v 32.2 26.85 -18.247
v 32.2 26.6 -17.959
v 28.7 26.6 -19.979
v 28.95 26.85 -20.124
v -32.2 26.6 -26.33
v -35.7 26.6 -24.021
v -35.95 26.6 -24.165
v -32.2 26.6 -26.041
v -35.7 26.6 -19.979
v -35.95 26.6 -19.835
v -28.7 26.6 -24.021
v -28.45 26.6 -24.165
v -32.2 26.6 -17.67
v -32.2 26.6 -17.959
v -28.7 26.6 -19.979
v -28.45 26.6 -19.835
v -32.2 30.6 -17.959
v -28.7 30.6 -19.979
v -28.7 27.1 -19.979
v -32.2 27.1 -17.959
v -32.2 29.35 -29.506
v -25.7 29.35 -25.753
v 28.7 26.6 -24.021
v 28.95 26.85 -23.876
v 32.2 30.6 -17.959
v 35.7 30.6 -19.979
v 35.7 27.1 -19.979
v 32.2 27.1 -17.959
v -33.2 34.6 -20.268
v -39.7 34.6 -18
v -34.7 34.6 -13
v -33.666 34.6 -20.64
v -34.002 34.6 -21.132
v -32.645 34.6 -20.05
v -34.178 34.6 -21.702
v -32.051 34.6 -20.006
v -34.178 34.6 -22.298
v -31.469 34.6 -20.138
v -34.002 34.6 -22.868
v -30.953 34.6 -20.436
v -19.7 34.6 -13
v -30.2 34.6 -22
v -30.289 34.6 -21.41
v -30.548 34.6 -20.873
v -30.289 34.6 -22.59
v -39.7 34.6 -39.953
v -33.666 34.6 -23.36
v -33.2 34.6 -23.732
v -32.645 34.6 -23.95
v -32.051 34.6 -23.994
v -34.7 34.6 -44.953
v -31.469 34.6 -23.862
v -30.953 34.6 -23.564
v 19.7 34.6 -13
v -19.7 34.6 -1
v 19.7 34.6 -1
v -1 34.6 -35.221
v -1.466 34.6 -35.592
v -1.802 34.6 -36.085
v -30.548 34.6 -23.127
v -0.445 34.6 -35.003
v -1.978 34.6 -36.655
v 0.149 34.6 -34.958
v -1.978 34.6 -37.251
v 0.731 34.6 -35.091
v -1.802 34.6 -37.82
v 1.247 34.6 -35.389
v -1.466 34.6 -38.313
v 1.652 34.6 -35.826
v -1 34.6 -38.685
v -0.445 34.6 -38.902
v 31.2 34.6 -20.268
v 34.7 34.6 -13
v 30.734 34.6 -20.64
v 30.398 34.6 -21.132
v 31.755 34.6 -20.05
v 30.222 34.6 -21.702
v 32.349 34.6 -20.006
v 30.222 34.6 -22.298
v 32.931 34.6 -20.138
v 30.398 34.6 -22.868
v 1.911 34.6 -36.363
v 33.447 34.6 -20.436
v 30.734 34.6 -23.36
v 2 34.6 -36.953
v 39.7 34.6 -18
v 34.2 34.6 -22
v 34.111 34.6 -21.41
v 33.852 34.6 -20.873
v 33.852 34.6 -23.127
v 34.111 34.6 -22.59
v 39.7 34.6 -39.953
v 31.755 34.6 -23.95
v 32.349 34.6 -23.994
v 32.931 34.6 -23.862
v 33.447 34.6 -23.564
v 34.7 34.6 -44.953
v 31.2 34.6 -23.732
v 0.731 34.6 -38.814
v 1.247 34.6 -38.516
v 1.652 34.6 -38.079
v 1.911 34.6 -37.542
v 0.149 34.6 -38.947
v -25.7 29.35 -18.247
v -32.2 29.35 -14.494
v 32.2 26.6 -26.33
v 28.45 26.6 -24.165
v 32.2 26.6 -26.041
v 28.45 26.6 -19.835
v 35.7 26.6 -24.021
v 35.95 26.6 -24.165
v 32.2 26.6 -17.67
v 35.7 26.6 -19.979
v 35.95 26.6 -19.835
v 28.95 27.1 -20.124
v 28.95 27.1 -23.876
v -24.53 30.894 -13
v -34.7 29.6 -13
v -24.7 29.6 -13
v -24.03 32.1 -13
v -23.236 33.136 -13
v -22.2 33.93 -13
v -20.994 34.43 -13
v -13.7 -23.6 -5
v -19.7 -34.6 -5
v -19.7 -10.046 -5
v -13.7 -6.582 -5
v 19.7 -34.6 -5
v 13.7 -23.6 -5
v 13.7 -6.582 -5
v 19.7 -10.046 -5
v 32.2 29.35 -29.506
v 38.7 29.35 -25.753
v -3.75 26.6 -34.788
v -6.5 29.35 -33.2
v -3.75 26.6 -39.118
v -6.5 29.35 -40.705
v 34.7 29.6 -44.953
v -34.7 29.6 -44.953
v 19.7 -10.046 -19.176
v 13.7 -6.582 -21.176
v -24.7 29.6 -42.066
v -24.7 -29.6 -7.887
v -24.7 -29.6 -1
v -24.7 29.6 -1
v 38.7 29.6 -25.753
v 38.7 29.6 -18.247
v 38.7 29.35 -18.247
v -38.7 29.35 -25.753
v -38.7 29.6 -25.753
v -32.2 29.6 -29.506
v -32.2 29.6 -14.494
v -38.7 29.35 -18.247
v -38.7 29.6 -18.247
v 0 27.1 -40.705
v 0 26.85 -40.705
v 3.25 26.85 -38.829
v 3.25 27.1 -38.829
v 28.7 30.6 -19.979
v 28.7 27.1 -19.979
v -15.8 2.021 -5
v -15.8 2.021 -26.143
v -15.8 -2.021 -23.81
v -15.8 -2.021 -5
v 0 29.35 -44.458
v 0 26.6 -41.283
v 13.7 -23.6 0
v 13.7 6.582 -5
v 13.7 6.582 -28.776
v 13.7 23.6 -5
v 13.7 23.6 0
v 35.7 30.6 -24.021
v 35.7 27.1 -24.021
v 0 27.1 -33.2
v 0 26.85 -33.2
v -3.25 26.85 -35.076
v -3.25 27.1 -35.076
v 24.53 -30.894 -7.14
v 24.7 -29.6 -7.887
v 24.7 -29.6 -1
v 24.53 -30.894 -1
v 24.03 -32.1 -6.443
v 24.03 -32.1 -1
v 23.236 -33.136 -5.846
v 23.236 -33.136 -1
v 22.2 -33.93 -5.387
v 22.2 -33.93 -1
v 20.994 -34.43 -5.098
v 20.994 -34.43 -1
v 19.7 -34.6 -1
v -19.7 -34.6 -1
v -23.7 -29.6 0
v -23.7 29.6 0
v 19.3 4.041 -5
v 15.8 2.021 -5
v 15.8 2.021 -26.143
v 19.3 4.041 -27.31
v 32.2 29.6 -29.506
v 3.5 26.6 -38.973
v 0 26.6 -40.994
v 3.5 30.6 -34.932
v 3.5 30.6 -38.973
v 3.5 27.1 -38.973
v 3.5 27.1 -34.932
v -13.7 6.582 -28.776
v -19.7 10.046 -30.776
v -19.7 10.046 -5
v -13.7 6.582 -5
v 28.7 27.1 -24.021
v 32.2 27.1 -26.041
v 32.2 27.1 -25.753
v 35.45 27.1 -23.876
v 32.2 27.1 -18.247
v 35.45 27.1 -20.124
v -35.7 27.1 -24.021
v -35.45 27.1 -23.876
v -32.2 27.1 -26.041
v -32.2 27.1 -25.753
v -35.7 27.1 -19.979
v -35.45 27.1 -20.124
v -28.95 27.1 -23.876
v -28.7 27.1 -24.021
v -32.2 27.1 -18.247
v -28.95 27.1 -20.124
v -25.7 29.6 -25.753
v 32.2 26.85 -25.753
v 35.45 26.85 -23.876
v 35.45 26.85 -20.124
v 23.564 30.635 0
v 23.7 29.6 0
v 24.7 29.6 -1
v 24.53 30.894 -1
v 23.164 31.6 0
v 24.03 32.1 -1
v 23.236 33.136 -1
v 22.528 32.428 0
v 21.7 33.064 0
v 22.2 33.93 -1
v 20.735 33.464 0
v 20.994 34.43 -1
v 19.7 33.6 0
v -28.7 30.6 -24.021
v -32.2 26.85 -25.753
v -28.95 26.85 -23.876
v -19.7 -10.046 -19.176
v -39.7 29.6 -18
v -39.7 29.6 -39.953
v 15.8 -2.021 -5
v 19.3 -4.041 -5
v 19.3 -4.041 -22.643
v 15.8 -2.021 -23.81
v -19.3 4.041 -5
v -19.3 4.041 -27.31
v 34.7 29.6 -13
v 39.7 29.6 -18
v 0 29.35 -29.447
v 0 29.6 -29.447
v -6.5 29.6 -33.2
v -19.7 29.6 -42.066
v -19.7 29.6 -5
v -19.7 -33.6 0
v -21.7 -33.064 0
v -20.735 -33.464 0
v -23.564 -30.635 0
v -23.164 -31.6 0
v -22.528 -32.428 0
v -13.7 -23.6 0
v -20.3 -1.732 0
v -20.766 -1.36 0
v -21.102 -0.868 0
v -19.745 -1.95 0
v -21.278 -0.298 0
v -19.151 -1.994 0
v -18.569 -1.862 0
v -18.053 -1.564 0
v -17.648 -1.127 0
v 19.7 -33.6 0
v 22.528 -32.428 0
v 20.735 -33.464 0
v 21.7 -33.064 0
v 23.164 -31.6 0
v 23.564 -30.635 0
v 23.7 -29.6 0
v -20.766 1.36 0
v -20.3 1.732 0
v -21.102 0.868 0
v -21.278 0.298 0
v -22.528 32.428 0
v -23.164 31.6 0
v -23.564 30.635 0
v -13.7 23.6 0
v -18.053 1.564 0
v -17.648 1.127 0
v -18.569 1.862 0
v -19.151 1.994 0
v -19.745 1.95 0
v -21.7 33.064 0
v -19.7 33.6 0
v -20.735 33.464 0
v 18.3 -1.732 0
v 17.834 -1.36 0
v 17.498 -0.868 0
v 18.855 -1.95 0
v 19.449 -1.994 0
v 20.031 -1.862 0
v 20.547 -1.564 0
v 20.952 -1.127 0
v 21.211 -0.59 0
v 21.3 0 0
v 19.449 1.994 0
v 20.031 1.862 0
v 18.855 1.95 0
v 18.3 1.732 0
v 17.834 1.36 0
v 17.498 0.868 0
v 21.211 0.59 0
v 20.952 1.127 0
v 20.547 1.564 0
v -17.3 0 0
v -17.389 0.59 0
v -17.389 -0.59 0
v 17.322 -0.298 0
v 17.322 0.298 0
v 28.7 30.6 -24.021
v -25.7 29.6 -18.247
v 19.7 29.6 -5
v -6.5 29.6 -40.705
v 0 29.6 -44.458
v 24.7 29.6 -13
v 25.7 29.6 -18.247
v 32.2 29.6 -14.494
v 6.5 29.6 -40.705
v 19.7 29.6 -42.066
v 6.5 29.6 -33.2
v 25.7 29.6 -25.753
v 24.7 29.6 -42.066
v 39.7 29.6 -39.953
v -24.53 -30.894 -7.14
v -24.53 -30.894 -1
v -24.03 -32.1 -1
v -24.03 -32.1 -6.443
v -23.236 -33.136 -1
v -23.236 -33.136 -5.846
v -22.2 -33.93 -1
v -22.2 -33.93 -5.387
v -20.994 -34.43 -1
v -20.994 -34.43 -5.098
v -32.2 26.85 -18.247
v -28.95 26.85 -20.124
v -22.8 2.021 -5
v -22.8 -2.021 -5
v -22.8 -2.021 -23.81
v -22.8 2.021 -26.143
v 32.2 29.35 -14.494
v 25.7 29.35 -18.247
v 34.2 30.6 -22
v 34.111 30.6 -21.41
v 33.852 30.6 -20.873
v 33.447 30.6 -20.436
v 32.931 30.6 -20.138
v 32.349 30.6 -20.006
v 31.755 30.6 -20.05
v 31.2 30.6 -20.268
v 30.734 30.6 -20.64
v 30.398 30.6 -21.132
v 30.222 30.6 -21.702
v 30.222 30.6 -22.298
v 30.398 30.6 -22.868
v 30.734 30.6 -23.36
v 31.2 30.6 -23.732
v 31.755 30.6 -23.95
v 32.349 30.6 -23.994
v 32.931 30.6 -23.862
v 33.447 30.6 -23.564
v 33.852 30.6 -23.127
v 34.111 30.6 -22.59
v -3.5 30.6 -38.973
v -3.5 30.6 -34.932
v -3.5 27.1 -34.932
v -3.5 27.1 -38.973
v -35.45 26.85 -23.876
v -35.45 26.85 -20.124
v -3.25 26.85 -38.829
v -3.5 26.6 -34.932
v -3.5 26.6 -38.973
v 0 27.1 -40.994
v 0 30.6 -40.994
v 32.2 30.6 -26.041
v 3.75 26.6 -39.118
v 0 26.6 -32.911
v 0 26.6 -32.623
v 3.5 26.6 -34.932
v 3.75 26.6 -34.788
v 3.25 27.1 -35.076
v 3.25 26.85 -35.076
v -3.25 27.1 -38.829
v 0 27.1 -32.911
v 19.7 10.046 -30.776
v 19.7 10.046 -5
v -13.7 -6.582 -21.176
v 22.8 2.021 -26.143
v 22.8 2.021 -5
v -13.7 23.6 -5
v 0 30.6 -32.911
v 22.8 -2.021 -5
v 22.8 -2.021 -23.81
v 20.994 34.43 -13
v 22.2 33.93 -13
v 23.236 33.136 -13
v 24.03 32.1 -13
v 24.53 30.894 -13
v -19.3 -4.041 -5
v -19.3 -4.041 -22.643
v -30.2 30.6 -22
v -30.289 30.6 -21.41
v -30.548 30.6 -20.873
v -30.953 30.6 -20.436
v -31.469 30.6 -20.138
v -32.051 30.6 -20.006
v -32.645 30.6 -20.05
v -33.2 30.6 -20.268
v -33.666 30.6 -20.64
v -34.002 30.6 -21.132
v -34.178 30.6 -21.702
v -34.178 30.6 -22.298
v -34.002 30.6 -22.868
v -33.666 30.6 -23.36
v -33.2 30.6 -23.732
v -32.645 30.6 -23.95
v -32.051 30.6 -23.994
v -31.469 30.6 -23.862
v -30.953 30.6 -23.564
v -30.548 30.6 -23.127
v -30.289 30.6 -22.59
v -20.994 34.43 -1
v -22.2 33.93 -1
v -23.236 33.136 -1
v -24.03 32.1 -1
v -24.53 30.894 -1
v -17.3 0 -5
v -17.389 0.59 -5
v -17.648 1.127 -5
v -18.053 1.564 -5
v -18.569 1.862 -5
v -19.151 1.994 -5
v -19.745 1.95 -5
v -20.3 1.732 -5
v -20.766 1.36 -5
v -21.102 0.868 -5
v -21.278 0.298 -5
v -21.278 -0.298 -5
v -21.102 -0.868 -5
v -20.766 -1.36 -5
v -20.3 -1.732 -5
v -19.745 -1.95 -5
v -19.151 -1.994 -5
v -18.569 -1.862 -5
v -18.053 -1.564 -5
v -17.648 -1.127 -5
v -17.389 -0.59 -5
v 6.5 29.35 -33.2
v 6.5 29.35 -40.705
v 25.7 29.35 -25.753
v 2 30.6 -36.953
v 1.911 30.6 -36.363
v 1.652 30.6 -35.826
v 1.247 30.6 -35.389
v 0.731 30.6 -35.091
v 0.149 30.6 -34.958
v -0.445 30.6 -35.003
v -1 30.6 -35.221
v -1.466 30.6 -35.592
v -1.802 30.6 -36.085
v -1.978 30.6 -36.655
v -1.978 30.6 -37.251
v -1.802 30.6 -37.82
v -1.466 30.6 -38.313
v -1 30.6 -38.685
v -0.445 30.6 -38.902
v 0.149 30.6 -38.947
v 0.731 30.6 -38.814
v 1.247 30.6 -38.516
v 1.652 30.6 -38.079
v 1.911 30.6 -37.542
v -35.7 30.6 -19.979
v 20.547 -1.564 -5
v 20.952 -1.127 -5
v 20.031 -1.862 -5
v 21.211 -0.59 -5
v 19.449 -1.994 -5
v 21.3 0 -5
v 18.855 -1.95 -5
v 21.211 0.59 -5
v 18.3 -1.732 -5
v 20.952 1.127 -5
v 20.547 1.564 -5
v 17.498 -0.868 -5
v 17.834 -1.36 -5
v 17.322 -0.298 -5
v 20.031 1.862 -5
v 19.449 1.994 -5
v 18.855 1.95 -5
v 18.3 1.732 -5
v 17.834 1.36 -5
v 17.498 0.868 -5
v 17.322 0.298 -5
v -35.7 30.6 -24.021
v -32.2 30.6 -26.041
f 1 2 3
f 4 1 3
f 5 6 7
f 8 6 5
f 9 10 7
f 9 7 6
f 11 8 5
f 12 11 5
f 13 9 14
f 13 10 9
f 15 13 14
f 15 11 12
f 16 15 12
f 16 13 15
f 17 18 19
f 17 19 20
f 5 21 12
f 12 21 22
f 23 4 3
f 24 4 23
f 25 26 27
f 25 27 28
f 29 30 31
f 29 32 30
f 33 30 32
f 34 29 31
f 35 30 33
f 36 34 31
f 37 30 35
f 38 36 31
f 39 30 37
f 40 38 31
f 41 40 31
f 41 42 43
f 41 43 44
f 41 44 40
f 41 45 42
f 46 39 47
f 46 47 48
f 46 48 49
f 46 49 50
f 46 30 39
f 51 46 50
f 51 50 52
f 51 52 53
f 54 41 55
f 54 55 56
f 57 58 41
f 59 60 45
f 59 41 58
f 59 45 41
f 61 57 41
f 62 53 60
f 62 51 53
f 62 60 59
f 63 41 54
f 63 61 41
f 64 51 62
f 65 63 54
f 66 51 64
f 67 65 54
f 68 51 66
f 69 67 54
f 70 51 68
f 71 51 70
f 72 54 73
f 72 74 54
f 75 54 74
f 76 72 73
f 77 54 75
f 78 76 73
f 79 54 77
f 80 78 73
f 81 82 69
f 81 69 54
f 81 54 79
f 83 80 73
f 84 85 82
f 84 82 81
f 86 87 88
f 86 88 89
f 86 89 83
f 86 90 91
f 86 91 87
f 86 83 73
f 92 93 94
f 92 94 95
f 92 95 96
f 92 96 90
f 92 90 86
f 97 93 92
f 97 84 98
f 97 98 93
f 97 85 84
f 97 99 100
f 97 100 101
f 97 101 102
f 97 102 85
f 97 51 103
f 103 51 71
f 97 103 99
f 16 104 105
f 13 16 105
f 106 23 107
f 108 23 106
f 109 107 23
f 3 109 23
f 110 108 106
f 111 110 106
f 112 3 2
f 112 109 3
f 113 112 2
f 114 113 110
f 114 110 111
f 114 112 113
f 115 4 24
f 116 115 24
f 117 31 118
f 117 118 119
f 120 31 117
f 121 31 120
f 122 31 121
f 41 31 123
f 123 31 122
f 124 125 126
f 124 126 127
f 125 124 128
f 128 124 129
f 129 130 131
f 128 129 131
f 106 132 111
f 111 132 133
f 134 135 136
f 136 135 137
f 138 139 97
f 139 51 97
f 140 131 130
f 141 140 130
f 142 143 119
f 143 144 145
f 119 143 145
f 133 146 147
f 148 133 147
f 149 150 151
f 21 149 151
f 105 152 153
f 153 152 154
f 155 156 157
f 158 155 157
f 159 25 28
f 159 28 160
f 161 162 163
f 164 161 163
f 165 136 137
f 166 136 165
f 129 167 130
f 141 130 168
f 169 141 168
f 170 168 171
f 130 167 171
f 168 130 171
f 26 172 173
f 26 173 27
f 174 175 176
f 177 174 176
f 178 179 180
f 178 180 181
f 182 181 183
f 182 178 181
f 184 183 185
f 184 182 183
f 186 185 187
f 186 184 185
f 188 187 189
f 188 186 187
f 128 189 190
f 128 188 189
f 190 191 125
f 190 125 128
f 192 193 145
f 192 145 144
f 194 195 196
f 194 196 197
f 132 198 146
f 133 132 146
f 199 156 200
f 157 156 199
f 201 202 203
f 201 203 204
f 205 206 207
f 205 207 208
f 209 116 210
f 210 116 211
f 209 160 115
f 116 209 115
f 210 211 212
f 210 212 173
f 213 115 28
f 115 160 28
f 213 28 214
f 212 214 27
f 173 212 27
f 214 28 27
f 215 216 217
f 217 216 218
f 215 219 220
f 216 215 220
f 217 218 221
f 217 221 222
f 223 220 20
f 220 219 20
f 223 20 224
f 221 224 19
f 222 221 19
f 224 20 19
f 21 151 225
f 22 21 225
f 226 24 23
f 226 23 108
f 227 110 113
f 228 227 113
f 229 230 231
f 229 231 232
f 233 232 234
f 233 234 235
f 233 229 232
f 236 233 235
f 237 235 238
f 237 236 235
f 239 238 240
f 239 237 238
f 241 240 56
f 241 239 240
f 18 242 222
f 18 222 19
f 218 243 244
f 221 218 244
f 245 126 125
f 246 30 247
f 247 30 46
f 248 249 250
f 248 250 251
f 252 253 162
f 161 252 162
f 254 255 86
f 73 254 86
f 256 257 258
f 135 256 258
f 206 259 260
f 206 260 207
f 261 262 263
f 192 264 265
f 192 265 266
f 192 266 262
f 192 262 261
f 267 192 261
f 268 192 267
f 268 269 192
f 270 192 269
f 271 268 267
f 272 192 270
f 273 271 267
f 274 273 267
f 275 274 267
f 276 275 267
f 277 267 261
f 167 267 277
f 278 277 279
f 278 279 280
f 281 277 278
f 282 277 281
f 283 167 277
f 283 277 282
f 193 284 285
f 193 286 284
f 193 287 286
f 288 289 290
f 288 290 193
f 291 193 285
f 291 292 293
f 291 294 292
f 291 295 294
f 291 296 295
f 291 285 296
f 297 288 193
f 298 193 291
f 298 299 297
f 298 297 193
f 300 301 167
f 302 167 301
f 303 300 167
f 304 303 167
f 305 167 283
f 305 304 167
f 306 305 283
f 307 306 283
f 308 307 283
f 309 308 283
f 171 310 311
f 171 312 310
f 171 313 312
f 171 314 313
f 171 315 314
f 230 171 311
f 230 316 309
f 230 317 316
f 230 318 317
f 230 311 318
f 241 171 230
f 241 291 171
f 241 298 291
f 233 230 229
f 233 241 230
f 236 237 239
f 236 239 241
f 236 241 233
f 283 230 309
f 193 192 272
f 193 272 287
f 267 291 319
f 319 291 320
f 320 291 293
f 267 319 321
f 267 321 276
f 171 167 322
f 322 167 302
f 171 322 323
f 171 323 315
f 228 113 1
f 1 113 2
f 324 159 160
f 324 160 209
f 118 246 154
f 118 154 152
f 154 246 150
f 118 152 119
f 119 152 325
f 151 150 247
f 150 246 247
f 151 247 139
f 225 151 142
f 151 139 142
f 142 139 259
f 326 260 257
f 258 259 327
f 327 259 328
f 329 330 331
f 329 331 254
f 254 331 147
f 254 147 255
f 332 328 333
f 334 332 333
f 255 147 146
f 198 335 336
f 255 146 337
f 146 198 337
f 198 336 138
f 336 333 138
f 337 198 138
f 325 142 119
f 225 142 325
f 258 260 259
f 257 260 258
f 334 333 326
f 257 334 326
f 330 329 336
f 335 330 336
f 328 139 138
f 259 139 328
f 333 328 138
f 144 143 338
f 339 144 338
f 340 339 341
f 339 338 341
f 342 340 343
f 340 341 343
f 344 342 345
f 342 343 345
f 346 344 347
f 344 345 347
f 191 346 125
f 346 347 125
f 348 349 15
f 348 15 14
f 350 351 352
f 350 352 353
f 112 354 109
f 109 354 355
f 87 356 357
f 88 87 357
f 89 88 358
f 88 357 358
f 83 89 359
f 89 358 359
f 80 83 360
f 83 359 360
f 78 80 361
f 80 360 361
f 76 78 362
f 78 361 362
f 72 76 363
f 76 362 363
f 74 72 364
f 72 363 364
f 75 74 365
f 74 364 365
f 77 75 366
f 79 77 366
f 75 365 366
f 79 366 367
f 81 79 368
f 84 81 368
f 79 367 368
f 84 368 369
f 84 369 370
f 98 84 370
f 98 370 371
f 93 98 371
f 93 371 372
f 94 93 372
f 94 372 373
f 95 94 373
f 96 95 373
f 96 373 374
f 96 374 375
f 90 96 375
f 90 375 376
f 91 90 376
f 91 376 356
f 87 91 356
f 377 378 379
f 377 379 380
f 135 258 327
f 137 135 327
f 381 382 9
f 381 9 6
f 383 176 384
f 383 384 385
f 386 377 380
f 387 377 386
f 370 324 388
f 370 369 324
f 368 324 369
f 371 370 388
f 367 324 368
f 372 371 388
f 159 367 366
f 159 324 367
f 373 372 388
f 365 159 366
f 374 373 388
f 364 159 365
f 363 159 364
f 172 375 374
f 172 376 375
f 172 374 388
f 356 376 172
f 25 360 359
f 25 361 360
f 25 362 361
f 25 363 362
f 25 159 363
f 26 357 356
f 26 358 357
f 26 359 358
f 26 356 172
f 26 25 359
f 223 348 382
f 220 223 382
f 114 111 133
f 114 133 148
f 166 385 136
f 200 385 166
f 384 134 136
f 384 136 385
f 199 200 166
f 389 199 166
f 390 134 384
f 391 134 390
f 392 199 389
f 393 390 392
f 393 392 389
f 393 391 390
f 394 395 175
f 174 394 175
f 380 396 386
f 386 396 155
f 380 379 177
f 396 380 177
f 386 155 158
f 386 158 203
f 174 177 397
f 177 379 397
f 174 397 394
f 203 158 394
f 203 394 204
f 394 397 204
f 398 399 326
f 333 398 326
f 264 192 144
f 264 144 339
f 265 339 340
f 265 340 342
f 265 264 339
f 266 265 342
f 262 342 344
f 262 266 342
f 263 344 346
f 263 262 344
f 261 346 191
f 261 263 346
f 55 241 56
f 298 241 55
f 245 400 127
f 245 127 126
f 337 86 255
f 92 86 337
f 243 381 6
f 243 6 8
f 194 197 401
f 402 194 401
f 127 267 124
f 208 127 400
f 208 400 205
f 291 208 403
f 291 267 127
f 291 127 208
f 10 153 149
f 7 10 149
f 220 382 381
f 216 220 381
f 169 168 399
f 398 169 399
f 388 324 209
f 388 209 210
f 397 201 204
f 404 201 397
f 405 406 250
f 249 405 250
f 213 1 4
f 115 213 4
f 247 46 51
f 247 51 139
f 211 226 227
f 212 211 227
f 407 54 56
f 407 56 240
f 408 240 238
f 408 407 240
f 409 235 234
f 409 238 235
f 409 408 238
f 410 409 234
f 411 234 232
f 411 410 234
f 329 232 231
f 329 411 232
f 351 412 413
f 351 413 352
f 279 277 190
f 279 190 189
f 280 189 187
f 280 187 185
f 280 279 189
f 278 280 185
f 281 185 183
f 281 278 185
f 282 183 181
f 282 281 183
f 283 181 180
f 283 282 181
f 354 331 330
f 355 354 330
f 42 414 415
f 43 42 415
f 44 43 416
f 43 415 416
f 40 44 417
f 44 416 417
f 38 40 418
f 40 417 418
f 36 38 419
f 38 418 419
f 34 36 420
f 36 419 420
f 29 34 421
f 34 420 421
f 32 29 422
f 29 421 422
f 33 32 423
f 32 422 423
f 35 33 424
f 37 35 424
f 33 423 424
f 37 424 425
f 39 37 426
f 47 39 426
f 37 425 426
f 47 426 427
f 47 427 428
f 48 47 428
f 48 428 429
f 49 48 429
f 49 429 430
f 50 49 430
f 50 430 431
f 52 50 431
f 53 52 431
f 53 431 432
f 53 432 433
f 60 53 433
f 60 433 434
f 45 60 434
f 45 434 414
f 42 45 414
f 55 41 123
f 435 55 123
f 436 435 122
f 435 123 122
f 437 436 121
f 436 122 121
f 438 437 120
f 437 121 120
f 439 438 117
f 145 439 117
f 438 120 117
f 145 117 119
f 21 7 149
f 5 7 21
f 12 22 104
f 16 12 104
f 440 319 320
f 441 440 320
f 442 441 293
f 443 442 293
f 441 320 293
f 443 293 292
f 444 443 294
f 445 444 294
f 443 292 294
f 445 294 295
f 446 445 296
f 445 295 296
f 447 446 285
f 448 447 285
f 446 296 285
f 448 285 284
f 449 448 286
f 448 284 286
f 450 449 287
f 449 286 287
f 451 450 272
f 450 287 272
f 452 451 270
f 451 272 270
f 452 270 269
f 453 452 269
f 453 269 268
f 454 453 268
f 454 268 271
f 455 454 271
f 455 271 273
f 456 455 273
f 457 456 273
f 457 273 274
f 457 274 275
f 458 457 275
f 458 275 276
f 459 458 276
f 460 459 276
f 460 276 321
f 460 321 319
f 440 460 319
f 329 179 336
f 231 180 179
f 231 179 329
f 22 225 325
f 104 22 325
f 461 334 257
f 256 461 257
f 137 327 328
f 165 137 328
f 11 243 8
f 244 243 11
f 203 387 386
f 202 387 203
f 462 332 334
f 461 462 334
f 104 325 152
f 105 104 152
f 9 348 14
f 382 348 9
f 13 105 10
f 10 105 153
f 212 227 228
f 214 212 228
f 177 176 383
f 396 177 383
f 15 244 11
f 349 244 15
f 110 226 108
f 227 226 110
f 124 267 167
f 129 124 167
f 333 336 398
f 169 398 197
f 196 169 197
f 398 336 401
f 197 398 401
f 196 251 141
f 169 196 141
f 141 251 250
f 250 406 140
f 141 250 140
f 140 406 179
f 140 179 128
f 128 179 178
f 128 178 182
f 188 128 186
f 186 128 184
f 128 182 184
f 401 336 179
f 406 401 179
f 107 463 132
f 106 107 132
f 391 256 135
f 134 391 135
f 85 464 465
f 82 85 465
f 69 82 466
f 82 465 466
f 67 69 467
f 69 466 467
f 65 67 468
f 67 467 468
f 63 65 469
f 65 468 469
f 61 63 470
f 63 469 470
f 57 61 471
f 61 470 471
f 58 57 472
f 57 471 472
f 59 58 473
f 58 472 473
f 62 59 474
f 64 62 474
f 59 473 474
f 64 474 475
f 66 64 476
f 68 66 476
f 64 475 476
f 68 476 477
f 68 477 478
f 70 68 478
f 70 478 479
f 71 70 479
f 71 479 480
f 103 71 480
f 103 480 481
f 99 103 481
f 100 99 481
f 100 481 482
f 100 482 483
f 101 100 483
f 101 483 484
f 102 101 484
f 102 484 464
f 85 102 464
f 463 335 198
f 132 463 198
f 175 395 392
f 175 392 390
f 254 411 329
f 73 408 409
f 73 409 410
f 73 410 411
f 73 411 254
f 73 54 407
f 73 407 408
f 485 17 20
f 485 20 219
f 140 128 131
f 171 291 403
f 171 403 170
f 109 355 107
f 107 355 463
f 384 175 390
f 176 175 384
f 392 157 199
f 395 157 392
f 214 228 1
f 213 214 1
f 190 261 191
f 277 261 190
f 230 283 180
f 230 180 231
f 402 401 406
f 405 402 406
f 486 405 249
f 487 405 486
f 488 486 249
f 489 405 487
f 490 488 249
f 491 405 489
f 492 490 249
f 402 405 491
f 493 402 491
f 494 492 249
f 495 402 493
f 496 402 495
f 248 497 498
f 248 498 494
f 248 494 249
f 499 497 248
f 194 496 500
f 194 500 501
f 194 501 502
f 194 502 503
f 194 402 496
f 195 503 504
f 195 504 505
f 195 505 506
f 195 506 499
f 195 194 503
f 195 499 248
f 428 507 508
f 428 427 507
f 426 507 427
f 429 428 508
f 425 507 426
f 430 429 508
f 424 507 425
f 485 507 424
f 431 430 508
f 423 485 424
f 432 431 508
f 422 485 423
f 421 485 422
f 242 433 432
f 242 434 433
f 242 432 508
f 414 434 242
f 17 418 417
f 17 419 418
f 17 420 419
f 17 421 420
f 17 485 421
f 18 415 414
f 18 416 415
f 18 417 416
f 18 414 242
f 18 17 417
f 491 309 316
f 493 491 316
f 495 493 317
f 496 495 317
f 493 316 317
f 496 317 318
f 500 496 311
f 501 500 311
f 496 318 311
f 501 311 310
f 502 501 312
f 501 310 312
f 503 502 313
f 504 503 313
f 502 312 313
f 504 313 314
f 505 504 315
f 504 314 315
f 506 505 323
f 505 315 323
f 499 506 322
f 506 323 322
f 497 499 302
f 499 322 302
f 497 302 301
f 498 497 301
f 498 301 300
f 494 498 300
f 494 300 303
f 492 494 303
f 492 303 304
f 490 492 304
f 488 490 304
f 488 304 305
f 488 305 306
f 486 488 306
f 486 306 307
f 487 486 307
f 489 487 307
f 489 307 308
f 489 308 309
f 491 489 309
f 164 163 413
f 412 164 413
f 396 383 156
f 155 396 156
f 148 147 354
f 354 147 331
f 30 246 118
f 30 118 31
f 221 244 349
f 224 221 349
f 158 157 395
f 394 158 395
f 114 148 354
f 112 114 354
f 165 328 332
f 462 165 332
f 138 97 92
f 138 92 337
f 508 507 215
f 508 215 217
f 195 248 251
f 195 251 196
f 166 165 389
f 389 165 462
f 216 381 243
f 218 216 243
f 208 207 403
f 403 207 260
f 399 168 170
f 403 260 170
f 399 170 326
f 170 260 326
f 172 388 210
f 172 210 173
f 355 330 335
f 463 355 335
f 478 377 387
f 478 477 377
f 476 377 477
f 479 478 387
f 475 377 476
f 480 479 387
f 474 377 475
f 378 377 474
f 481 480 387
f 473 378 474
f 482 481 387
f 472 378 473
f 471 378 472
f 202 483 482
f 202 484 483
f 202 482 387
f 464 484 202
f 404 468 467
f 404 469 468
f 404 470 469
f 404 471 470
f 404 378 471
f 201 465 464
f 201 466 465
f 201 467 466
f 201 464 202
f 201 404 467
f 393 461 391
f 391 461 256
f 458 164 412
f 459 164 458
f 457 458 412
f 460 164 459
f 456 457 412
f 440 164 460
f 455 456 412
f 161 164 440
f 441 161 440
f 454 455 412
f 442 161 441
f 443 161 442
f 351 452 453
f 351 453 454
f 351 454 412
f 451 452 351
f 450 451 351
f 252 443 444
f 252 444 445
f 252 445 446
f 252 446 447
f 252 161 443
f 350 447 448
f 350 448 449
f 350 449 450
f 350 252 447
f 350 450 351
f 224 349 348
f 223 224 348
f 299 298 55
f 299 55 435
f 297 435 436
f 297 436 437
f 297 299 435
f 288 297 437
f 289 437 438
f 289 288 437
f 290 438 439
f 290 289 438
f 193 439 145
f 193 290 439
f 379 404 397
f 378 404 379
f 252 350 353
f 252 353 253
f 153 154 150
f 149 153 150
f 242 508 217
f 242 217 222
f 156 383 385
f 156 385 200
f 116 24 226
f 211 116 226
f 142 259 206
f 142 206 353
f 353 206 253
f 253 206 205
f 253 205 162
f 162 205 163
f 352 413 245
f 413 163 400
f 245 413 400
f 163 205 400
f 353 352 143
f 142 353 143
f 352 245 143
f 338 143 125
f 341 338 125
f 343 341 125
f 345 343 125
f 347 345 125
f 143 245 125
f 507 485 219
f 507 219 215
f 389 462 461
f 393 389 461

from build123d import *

# Parameters (mm, degrees)
SKETCH1_W           = 49.4
SKETCH1_H           = 69.2
SKETCH1_W_2         = 27.4
SKETCH1_H_2         = 47.2
BOSS_EXTRUDE1_DEPTH = 5
SKETCH2_R           = 2
CUT_EXTRUDE1_DEPTH  = 15
BOSS_EXTRUDE2_DEPTH = 49.4
CUT_EXTRUDE2_DEPTH  = 40.952638628
SKETCH5_W           = 27.4
SKETCH5_H           = 47.2
CUT_EXTRUDE3_DEPTH  = 93
CUT_EXTRUDE4_START  = -5
CUT_EXTRUDE4_DEPTH  = 93
SKETCH7_W           = 79.4
SKETCH7_H           = 44.952638628
BOSS_EXTRUDE3_DEPTH = 5
BOSS_EXTRUDE4_DEPTH = 3
CUT_EXTRUDE5_DEPTH  = 1
SKETCH10_R          = 2
CUT_EXTRUDE6_DEPTH  = 5
SKETCH11_W          = 15
SKETCH11_H          = 5
CUT_EXTRUDE7_DEPTH  = 13
CHAMFER1_SIZE       = 2.75
BOSS_EXTRUDE5_DEPTH = 0.5
CHAMFER2_SIZE       = 0.25
FILLET1_R           = 5
CHAMFER3_SIZE       = 1
CHAMFER4_SIZE       = 5


with BuildPart() as part:
    # Sketch1 → Boss-Extrude1 (new body)
    with BuildSketch(Plane.XY):
        Rectangle(SKETCH1_W, SKETCH1_H)
        Rectangle(SKETCH1_W_2, SKETCH1_H_2, mode=Mode.SUBTRACT)
    extrude(amount=-BOSS_EXTRUDE1_DEPTH)

    # Sketch2 → Cut-Extrude1 (cut)
    with BuildSketch(Plane.XY):
        with Locations((19.3, 0)):
            Circle(SKETCH2_R)
        with Locations((-19.3, 0)):
            Circle(SKETCH2_R)
    extrude(amount=-CUT_EXTRUDE1_DEPTH, mode=Mode.SUBTRACT)

    # Sketch4 → Boss-Extrude2 (add)
    with BuildSketch(Plane(origin=(24.7, 0, 0), x_dir=(0, 0, -1), z_dir=(1, 0, 0))):
        Polygon((5, 34.6), (44.952638628, 34.6), (5, -34.6), align=None)
    extrude(amount=-BOSS_EXTRUDE2_DEPTH)

    # Sketch3 → Cut-Extrude2 (cut, through all)
    with BuildSketch(Plane(origin=(0, 0, -5), x_dir=(-1, 0, 0), z_dir=(0, 0, -1))):
        Polygon((-19.3, -4.041451884), (-15.8, -2.020725942), (-15.8, 2.020725942), (-19.3, 4.041451884), (-22.8, 2.020725942), (-22.8, -2.020725942), align=None)
        Polygon((19.3, -4.041451884), (22.8, -2.020725942), (22.8, 2.020725942), (19.3, 4.041451884), (15.8, 2.020725942), (15.8, -2.020725942), align=None)
    extrude(amount=CUT_EXTRUDE2_DEPTH, mode=Mode.SUBTRACT)

    # Sketch5 → Cut-Extrude3 (cut)
    with BuildSketch(Plane.XY.offset(-5)):
        Rectangle(SKETCH5_W, SKETCH5_H)
    extrude(amount=-CUT_EXTRUDE3_DEPTH, mode=Mode.SUBTRACT)

    # Sketch6 → Cut-Extrude4 (cut)
    with BuildSketch(Plane.XY.offset(CUT_EXTRUDE4_START)):
        Polygon((19.7, 29.6), (-19.7, 29.6), (-19.7, 10.045894684), (-10.8, 4.907477288), (-10.8, -4.907477288), (-19.7, -10.045894684), (-19.7, -34.6), (19.7, -34.6), (19.7, -10.045894684), (10.8, -4.907477288), (10.8, 4.907477288), (19.7, 10.045894684), align=None)
    extrude(amount=-CUT_EXTRUDE4_DEPTH, mode=Mode.SUBTRACT)

    # Sketch7 → Boss-Extrude3 (add)
    with BuildSketch(Plane(origin=(0, 34.6, 0), x_dir=(1, 0, 0), z_dir=(0, 1, 0))):
        with Locations((0, 22.476319314)):
            Rectangle(SKETCH7_W, SKETCH7_H)
    extrude(amount=-BOSS_EXTRUDE3_DEPTH)

    # Sketch8 → Boss-Extrude4 (add)
    with BuildSketch(Plane.XZ.offset(-29.6)):
        Polygon((25.7, -25.75277675), (32.2, -29.505553499), (38.7, -25.75277675), (38.7, -18.24722325), (32.2, -14.494446501), (25.7, -18.24722325), align=None)
        Polygon((32.2, -17.958548116), (28.7, -19.979274058), (28.7, -24.020725942), (32.2, -26.041451884), (35.7, -24.020725942), (35.7, -19.979274058), align=None, mode=Mode.SUBTRACT)
        Polygon((-32.2, -14.494446501), (-38.7, -18.24722325), (-38.7, -25.75277675), (-32.2, -29.505553499), (-25.7, -25.75277675), (-25.7, -18.24722325), align=None)
        Polygon((-32.2, -17.958548116), (-35.7, -19.979274058), (-35.7, -24.020725942), (-32.2, -26.041451884), (-28.7, -24.020725942), (-28.7, -19.979274058), align=None, mode=Mode.SUBTRACT)
        Polygon((0, -29.447085128), (-6.5, -33.199861878), (-6.5, -40.705415378), (0, -44.458192127), (6.5, -40.705415378), (6.5, -33.199861878), align=None)
        Polygon((-3.5, -34.931912686), (-3.5, -38.97336457), (0, -40.994090512), (3.5, -38.97336457), (3.5, -34.931912686), (0, -32.911186744), align=None, mode=Mode.SUBTRACT)
    extrude(amount=BOSS_EXTRUDE4_DEPTH)

    # Sketch9 → Cut-Extrude5 (cut)
    with BuildSketch(Plane.XZ.offset(-29.6)):
        Polygon((35.7, -24.020725942), (35.7, -19.979274058), (32.2, -17.958548116), (28.7, -19.979274058), (28.7, -24.020725942), (32.2, -26.041451884), align=None)
        Polygon((3.5, -34.931912686), (0, -32.911186744), (-3.5, -34.931912686), (-3.5, -38.97336457), (0, -40.994090512), (3.5, -38.97336457), align=None)
        Polygon((-28.7, -24.020725942), (-28.7, -19.979274058), (-32.2, -17.958548116), (-35.7, -19.979274058), (-35.7, -24.020725942), (-32.2, -26.041451884), align=None)
    extrude(amount=-CUT_EXTRUDE5_DEPTH, mode=Mode.SUBTRACT)

    # Sketch10 → Cut-Extrude6 (cut, through all)
    with BuildSketch(Plane.XZ.offset(-30.6)):
        with Locations((32.2, -22)):
            Circle(SKETCH10_R)
        with Locations((0, -36.952638628)):
            Circle(SKETCH10_R)
        with Locations((-32.2, -22)):
            Circle(SKETCH10_R)
    extrude(amount=-CUT_EXTRUDE6_DEPTH, mode=Mode.SUBTRACT)

    # Sketch11 → Cut-Extrude7 (cut)
    with BuildSketch(Plane.XY):
        with Locations((32.2, 32.1)):
            Rectangle(SKETCH11_W, SKETCH11_H)
        with Locations((-32.2, 32.1)):
            Rectangle(SKETCH11_W, SKETCH11_H)
    extrude(amount=-CUT_EXTRUDE7_DEPTH, mode=Mode.SUBTRACT)

    # Chamfer1
    chamfer1_edges = [part.edges().sort_by_distance(p)[0] for p in [
        (25.7, 26.6, -22),
        (28.95, 26.6, -27.629165125),
        (35.45, 26.6, -27.629165125),
        (38.7, 26.6, -22),
        (35.45, 26.6, -16.370834875),
        (28.95, 26.6, -16.370834875),
        (-28.95, 26.6, -16.370834875),
        (-35.45, 26.6, -16.370834875),
        (-38.7, 26.6, -22),
        (-35.45, 26.6, -27.629165125),
        (-28.95, 26.6, -27.629165125),
        (-25.7, 26.6, -22),
        (3.25, 26.6, -31.323473503),
        (-3.25, 26.6, -31.323473503),
        (-6.5, 26.6, -36.952638628),
        (-3.25, 26.6, -42.581803753),
        (3.25, 26.6, -42.581803753),
        (6.5, 26.6, -36.952638628),
    ]]
    chamfer(chamfer1_edges, length=CHAMFER1_SIZE)

    # Sketch12 → Boss-Extrude5 (add)
    with BuildSketch(Plane.XZ.offset(-26.6)):
        Polygon((32.2, -26.041451884), (35.7, -24.020725942), (35.7, -19.979274058), (32.2, -17.958548116), (28.7, -19.979274058), (28.7, -24.020725942), align=None)
        Polygon((35.45, -20.123611625), (32.2, -18.24722325), (28.95, -20.123611625), (28.95, -23.876388375), (32.2, -25.75277675), (35.45, -23.876388375), align=None, mode=Mode.SUBTRACT)
        Polygon((3.5, -38.97336457), (3.5, -34.931912686), (0, -32.911186744), (-3.5, -34.931912686), (-3.5, -38.97336457), (0, -40.994090512), align=None)
        Polygon((-3.25, -38.829027003), (0, -40.705415378), (3.25, -38.829027003), (3.25, -35.076250253), (0, -33.199861878), (-3.25, -35.076250253), align=None, mode=Mode.SUBTRACT)
        Polygon((-32.2, -26.041451884), (-28.7, -24.020725942), (-28.7, -19.979274058), (-32.2, -17.958548116), (-35.7, -19.979274058), (-35.7, -24.020725942), align=None)
        Polygon((-35.45, -23.876388375), (-32.2, -25.75277675), (-28.95, -23.876388375), (-28.95, -20.123611625), (-32.2, -18.24722325), (-35.45, -20.123611625), align=None, mode=Mode.SUBTRACT)
    extrude(amount=-BOSS_EXTRUDE5_DEPTH)

    # Chamfer2
    chamfer2_edges = [part.edges().sort_by_distance(p)[0] for p in [
        (35.45, 26.6, -22),
        (33.825, 26.6, -24.814582562),
        (30.575, 26.6, -24.814582562),
        (28.95, 26.6, -22),
        (30.575, 26.6, -19.185417438),
        (33.825, 26.6, -19.185417438),
        (-3.25, 26.6, -36.952638628),
        (-1.625, 26.6, -34.138056066),
        (1.625, 26.6, -34.138056066),
        (3.25, 26.6, -36.952638628),
        (1.625, 26.6, -39.76722119),
        (-1.625, 26.6, -39.76722119),
        (-35.45, 26.6, -22),
        (-33.825, 26.6, -19.185417438),
        (-30.575, 26.6, -19.185417438),
        (-28.95, 26.6, -22),
        (-30.575, 26.6, -24.814582562),
        (-33.825, 26.6, -24.814582562),
    ]]
    chamfer(chamfer2_edges, length=CHAMFER2_SIZE)

    # Fillet1
    fillet1_edges = [part.edges().sort_by_distance(p)[0] for p in [
        (24.7, -34.6, -2.5),
        (-24.7, -34.6, -2.5),
        (-24.7, 34.6, -6.5),
        (24.7, 34.6, -6.5),
    ]]
    fillet(fillet1_edges, radius=FILLET1_R)

    # Chamfer3
    chamfer3_edges = [part.edges().sort_by_distance(p)[0] for p in [
        (0, -34.6, 0),
        (0, 34.6, 0),
        (-24.7, 0, 0),
        (24.7, 0, 0),
        (23.235533906, 33.135533906, 0),
        (-23.235533906, 33.135533906, 0),
        (-23.235533906, -33.135533906, 0),
        (23.235533906, -33.135533906, 0),
    ]]
    chamfer(chamfer3_edges, length=CHAMFER3_SIZE)

    # Chamfer4
    chamfer4_edges = [part.edges().sort_by_distance(p)[0] for p in [
        (-39.7, 32.1, -44.952638628),
        (39.7, 32.1, -44.952638628),
        (39.7, 32.1, -13),
        (-39.7, 32.1, -13),
    ]]
    chamfer(chamfer4_edges, length=CHAMFER4_SIZE)


solid = part.part
